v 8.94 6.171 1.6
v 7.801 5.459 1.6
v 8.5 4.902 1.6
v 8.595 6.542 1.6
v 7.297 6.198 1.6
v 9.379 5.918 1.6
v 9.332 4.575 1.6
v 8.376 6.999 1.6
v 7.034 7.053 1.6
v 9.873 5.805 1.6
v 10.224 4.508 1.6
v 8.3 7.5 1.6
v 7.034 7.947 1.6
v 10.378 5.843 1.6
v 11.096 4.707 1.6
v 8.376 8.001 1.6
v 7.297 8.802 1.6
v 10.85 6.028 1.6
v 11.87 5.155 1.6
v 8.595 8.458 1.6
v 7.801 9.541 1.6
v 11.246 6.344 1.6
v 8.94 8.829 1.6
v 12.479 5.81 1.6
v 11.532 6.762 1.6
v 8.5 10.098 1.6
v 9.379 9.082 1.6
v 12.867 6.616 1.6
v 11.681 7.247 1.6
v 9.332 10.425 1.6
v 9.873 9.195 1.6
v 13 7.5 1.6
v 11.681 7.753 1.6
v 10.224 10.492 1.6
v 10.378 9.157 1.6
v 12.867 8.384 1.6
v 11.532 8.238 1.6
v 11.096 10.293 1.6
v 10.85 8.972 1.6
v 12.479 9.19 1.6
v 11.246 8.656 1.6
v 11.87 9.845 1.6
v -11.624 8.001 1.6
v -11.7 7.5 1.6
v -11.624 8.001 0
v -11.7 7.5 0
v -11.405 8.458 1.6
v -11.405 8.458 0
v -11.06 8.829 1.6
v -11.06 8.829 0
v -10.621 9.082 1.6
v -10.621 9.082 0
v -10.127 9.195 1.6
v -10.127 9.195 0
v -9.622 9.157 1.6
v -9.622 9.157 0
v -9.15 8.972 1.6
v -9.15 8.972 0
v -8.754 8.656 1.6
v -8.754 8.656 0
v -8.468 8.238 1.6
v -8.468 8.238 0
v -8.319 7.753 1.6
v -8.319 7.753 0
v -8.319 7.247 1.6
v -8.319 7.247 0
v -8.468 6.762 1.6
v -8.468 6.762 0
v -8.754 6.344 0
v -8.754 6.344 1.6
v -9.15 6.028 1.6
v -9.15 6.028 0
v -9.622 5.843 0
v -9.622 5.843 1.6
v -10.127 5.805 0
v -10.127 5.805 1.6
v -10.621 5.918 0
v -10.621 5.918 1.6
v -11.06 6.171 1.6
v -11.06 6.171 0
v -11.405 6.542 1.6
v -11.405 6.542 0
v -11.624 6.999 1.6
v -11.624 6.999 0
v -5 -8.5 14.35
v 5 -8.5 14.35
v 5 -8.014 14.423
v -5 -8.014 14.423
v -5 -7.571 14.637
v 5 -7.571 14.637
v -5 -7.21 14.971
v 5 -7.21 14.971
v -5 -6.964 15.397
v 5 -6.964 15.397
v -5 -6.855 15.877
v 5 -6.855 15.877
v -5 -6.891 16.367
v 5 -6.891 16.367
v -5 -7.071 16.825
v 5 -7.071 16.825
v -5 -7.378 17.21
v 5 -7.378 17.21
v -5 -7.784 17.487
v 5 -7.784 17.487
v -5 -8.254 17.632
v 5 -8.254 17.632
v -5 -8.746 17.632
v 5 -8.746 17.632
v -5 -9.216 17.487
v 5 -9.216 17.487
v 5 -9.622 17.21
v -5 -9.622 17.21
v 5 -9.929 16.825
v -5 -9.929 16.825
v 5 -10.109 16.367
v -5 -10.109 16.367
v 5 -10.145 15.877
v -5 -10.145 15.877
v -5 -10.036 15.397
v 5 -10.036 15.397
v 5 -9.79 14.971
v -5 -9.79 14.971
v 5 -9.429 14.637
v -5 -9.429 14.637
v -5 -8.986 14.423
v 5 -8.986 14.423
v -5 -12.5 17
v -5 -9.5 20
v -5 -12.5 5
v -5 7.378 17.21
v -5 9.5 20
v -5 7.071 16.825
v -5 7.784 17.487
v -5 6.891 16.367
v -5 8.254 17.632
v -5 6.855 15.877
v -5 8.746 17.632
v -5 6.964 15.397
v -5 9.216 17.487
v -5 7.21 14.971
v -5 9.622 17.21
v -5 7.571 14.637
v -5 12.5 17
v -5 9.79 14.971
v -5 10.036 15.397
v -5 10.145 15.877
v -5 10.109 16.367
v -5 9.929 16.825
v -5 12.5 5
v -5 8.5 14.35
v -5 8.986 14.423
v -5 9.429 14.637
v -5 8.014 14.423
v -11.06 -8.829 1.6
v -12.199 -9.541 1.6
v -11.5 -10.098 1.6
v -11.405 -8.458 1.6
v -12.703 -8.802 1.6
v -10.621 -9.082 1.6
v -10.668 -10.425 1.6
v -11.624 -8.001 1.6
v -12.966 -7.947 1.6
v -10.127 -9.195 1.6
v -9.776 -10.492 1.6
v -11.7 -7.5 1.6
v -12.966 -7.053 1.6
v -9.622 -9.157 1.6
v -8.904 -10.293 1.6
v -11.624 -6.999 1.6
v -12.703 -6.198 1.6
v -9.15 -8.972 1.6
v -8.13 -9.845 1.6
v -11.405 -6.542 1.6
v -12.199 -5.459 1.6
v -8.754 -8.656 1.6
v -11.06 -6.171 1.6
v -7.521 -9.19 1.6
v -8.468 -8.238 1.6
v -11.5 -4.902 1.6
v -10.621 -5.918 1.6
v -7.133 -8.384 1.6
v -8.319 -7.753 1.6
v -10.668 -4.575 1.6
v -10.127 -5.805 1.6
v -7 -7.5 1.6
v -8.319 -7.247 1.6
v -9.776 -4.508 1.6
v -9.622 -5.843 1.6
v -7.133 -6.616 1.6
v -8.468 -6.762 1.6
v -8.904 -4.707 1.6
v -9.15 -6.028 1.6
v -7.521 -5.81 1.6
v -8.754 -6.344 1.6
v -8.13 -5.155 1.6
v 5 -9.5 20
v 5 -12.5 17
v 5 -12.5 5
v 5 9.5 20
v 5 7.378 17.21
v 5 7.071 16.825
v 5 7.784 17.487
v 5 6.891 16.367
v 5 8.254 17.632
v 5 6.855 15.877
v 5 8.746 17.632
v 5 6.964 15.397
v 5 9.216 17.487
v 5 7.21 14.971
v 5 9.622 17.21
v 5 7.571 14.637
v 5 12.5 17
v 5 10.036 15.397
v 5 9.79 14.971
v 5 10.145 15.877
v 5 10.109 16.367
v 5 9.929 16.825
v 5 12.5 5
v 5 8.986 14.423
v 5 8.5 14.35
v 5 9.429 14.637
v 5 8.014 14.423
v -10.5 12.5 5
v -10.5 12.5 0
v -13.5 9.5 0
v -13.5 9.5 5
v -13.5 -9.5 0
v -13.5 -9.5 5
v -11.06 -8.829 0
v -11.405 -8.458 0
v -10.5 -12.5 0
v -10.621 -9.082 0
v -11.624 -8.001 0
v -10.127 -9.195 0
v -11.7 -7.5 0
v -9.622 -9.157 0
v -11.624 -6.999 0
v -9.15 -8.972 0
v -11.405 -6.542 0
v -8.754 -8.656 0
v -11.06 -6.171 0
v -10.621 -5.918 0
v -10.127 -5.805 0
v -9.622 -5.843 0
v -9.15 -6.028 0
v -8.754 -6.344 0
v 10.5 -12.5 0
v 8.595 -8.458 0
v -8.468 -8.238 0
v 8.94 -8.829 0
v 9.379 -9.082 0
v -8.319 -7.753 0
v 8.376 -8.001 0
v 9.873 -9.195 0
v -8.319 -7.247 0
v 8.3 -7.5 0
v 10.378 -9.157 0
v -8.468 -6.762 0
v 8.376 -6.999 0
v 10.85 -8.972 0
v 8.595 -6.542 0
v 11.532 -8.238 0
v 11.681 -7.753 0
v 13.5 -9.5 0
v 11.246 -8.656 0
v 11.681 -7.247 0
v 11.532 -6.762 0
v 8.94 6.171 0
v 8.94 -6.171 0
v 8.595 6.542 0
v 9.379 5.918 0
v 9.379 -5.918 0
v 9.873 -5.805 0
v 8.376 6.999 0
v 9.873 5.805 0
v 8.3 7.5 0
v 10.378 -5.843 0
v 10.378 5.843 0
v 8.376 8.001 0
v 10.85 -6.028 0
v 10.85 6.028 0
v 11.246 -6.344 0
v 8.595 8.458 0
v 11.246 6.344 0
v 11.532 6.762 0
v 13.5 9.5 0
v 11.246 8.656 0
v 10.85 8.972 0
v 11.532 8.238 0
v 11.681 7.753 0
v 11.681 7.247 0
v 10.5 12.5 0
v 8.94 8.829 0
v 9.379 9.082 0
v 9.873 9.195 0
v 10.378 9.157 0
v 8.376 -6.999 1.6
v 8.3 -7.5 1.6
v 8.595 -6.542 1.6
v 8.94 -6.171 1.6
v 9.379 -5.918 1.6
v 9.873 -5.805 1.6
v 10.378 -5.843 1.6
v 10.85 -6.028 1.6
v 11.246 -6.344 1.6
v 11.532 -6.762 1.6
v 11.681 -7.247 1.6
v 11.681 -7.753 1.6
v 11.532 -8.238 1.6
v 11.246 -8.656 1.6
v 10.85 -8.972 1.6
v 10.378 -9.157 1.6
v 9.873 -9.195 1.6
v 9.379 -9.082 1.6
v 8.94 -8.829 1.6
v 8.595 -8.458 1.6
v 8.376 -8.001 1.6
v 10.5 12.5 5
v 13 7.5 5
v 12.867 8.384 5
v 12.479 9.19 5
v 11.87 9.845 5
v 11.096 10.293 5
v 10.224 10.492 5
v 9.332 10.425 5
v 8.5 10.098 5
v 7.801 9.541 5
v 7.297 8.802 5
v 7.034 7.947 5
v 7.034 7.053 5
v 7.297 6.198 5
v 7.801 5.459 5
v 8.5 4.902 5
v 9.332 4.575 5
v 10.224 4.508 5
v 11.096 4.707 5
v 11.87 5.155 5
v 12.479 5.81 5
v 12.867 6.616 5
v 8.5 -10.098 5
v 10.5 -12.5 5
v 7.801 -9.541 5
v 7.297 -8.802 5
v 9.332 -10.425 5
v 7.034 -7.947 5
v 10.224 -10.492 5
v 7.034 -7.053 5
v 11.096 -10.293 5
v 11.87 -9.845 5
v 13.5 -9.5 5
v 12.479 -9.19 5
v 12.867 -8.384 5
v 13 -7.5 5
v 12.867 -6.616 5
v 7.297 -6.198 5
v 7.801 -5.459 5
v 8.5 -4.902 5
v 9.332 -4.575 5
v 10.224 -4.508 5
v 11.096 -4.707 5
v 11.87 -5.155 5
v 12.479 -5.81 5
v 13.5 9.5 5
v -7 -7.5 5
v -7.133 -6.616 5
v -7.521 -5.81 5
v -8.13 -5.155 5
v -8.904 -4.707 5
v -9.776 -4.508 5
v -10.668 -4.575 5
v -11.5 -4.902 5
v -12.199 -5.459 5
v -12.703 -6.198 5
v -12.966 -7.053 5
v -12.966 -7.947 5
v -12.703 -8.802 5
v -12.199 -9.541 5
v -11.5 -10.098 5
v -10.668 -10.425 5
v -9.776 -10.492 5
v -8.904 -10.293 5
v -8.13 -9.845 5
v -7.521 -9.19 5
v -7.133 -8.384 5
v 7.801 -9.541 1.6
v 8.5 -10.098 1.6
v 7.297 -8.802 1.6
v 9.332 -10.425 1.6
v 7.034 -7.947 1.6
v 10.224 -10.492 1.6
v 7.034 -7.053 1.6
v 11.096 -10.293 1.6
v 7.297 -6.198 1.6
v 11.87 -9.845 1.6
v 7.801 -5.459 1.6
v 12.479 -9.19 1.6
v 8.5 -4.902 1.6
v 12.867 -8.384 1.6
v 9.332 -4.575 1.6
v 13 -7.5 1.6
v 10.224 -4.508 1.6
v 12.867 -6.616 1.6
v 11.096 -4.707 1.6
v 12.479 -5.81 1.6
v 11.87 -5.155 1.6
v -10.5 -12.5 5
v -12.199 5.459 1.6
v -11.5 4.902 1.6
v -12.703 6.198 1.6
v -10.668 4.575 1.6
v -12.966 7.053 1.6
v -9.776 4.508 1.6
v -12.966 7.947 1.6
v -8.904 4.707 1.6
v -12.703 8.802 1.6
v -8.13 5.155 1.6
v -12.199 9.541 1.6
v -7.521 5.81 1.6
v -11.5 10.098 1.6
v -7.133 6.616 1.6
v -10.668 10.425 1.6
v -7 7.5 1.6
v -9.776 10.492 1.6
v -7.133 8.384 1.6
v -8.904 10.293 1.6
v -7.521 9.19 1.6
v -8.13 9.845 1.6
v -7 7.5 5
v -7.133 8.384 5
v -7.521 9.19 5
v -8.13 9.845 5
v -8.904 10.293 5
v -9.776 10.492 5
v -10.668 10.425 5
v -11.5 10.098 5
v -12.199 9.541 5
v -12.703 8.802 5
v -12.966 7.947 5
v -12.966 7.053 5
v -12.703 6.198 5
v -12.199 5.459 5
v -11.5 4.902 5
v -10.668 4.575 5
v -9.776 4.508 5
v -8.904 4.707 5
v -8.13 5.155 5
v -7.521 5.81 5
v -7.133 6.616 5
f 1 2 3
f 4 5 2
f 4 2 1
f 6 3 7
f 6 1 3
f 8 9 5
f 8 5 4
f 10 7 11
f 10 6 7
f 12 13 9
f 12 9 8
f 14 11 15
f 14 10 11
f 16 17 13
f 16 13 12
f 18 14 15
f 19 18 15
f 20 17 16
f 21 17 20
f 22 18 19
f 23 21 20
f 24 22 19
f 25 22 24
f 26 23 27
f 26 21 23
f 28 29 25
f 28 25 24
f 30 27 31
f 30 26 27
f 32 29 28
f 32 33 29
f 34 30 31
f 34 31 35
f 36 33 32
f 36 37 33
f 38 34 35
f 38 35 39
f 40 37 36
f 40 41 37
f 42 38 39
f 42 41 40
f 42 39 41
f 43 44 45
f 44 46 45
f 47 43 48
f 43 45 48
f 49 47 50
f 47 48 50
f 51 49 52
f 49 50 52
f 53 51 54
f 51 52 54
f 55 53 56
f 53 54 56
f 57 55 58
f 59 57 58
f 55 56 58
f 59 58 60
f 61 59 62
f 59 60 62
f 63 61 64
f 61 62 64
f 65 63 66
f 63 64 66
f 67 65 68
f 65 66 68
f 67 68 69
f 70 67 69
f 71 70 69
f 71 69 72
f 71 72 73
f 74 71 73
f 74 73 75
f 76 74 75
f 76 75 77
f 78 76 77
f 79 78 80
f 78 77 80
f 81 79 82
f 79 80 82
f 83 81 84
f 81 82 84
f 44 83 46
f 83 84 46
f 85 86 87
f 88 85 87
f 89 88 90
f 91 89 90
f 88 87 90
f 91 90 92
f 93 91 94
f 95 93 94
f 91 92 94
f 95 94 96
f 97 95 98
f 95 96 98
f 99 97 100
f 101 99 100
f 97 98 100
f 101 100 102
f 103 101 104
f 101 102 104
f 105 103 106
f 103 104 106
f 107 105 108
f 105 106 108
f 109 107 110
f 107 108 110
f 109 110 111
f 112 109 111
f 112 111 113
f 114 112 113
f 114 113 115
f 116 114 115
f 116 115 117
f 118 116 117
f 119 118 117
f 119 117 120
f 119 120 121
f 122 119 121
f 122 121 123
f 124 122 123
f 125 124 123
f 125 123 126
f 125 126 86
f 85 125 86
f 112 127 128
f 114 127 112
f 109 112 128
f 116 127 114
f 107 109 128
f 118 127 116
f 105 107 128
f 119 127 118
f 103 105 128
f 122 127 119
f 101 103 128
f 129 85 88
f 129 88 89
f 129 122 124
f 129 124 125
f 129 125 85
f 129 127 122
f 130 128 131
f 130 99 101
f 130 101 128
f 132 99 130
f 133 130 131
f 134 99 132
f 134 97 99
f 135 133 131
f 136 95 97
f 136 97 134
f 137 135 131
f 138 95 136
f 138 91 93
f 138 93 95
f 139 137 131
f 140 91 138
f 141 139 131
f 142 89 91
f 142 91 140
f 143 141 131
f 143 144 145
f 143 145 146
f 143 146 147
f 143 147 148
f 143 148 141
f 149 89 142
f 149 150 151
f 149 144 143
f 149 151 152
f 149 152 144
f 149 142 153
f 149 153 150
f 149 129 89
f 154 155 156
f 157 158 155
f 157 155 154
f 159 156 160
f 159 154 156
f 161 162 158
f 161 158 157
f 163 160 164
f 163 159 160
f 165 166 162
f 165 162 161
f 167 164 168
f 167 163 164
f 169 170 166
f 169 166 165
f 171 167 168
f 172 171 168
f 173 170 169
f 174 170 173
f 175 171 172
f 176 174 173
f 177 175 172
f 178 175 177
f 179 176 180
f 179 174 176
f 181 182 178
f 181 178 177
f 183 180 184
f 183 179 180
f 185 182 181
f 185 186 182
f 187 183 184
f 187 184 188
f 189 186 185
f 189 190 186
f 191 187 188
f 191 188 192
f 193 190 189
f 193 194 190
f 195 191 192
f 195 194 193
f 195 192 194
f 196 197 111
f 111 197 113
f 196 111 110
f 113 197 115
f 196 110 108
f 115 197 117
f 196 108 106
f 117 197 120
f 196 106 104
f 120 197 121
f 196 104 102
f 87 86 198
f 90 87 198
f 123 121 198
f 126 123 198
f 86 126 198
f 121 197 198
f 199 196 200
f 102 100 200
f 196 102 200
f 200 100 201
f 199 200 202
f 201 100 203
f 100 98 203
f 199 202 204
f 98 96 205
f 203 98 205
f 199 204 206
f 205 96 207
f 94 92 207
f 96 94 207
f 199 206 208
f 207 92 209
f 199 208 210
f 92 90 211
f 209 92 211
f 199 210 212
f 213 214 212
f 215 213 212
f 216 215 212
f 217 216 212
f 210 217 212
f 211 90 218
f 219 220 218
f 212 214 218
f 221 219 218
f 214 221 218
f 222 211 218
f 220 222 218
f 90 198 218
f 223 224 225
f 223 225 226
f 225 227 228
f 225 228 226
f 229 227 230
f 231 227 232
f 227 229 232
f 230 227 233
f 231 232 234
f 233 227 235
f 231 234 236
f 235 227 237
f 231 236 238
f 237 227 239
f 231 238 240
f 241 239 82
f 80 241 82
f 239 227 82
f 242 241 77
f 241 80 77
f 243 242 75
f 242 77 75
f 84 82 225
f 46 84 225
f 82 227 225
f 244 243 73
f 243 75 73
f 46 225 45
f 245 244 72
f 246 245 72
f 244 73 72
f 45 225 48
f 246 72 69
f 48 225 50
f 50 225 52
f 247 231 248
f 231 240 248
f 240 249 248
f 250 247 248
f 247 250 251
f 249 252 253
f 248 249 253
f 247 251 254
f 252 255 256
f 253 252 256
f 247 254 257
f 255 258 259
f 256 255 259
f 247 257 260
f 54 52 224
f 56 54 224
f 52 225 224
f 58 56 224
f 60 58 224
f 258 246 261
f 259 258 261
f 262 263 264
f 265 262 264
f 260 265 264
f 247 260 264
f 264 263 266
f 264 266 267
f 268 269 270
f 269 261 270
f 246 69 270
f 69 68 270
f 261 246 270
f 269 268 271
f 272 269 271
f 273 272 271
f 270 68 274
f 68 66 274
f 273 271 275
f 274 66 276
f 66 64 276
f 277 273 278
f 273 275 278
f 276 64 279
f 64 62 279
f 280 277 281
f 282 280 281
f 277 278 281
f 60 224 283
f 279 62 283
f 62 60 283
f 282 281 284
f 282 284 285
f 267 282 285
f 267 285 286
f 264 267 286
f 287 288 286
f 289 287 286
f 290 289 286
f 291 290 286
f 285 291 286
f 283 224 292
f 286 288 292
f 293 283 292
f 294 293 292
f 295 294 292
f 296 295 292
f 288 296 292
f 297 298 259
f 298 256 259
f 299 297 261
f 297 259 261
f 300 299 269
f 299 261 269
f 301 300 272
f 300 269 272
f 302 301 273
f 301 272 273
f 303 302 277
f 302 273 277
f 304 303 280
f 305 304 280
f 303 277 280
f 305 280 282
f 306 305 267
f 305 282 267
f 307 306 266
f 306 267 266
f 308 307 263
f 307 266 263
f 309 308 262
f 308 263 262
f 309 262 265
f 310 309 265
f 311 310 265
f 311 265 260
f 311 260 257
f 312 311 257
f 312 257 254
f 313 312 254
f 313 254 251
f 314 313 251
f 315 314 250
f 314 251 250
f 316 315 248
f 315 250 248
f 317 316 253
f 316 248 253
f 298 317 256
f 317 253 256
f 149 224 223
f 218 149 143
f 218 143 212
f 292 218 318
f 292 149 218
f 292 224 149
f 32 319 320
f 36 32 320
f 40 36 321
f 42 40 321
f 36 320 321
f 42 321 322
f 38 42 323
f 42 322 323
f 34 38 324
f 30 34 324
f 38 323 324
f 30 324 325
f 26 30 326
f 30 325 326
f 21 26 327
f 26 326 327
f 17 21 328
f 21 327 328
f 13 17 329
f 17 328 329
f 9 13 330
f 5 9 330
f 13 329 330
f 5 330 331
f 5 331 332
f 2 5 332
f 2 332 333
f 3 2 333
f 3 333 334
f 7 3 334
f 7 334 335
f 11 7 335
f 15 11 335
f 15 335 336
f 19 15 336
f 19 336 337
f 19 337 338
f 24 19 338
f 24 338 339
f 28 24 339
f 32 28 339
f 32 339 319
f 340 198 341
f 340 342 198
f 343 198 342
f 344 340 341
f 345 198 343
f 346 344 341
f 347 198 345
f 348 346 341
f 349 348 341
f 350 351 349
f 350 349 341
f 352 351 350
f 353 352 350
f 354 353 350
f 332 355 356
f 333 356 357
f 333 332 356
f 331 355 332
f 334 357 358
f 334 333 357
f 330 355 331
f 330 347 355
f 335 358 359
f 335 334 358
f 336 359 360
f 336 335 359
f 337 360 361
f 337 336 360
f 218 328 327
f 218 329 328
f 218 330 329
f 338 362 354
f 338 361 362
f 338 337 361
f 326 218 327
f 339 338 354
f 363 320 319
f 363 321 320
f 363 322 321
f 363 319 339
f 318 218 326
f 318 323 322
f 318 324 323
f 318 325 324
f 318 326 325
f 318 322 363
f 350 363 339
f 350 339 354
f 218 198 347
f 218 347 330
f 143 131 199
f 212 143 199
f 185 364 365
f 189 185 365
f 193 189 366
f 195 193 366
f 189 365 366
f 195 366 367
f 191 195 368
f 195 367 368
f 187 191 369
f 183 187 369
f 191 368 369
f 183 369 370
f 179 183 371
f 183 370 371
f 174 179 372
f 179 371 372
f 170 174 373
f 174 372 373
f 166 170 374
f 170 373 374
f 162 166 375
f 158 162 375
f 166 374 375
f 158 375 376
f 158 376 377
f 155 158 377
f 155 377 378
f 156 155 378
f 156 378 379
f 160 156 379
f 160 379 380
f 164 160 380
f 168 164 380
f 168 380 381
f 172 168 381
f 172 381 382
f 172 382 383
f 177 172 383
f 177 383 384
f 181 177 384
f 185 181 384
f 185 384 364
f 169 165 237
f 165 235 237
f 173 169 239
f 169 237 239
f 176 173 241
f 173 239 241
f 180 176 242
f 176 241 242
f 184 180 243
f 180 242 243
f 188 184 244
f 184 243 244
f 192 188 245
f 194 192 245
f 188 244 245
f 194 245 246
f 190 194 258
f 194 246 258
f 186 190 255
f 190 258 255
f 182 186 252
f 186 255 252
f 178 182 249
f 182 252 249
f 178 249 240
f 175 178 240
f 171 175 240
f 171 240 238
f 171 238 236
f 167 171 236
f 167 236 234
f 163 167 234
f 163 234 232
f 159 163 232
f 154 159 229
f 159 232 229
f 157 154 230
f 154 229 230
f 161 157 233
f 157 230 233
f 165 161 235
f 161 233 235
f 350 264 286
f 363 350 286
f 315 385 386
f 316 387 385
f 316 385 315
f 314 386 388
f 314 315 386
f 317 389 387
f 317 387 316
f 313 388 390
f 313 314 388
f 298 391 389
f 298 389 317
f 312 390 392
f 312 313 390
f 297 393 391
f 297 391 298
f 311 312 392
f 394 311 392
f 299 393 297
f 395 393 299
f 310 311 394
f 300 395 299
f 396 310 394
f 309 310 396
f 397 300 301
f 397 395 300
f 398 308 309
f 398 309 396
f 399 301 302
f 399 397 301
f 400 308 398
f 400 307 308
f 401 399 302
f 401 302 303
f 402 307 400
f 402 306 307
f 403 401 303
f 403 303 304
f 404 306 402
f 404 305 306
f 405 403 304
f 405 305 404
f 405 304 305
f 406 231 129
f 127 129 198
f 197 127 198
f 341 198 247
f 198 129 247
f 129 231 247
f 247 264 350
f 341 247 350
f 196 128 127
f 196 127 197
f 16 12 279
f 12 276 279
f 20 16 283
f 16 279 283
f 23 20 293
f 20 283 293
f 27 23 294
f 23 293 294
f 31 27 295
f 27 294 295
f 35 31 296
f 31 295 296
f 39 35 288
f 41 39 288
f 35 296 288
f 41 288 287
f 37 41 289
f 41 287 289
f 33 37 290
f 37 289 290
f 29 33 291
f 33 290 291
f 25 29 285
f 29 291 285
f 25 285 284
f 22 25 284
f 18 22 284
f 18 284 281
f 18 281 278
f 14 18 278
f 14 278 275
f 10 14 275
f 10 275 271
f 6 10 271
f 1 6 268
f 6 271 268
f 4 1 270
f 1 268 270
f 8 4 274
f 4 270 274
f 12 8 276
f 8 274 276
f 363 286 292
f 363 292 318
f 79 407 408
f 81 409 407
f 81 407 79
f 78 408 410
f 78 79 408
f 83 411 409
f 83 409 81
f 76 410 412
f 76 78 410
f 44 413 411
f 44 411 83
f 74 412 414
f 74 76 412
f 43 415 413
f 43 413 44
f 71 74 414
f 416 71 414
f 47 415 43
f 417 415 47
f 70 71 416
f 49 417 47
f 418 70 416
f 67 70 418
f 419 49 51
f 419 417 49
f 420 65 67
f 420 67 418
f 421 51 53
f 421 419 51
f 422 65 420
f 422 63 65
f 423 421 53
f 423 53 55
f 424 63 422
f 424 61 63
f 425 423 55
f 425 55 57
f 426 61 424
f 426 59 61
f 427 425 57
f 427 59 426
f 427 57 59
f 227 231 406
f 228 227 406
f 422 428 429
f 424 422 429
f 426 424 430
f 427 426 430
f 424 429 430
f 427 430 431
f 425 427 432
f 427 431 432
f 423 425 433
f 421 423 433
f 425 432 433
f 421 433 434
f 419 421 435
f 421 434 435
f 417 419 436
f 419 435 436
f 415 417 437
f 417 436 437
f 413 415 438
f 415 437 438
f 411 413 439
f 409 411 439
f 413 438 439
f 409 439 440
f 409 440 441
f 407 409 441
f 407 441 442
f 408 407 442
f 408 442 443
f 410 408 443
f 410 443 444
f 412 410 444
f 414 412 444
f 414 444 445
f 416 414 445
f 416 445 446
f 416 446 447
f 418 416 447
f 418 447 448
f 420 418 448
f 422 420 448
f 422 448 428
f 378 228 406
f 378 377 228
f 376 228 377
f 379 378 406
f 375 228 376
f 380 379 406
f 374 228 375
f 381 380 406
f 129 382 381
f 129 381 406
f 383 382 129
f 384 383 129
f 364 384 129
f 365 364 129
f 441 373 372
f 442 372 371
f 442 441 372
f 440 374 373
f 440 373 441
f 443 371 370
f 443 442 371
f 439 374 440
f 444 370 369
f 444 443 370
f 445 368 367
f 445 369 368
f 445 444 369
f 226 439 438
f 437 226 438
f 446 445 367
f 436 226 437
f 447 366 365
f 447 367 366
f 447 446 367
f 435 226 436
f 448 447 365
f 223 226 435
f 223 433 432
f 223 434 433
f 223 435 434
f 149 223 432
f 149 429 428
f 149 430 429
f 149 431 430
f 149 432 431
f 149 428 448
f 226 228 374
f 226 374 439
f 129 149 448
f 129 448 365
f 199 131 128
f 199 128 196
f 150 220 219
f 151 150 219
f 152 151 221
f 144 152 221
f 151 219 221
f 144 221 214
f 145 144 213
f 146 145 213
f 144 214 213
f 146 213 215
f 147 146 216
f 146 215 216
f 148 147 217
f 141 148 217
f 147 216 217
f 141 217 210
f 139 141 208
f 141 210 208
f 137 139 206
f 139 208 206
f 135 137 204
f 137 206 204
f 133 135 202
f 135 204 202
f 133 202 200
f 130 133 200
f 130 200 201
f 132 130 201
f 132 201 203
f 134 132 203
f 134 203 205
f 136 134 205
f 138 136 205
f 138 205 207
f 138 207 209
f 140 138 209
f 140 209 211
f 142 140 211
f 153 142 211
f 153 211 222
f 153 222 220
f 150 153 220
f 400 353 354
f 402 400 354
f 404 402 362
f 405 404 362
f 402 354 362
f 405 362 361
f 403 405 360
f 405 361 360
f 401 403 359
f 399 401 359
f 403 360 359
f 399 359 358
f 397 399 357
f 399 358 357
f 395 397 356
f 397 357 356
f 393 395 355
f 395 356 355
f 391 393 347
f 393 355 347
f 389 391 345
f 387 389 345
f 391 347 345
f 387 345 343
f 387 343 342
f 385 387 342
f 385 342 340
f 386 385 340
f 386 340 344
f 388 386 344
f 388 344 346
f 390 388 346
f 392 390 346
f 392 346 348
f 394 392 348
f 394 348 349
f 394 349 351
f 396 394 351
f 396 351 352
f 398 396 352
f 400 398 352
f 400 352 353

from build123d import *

# Parameters (mm, degrees)
SKETCH1_W                                            = 27
SKETCH1_H                                            = 25
BOSS_EXTRUDE1_DEPTH                                  = 5
SKETCH2_W                                            = 10
SKETCH2_H                                            = 25
BOSS_EXTRUDE2_DEPTH                                  = 15
CBORE_FOR_M3_HEXAGON_SOCKET_HEAD_CAP_SCR_D           = 3.4
CBORE_FOR_M3_HEXAGON_SOCKET_HEAD_CAP_SCR_CBORE_D     = 6
CBORE_FOR_M3_HEXAGON_SOCKET_HEAD_CAP_SCR_CBORE_DEPTH = 3.4
M4_TAPPED_HOLE1_D                                    = 3.3
CHAMFER1_SIZE                                        = 3


with BuildPart() as part:
    # Sketch1 → Boss-Extrude1 (new body)
    with BuildSketch(Plane.XY):
        Rectangle(SKETCH1_W, SKETCH1_H)
    extrude(amount=BOSS_EXTRUDE1_DEPTH)

    # Sketch2 → Boss-Extrude2 (add)
    with BuildSketch(Plane.XY.offset(5)):
        Rectangle(SKETCH2_W, SKETCH2_H)
    extrude(amount=BOSS_EXTRUDE2_DEPTH)

    # CBORE for M3 Hexagon socket head cap screws1 (through all)
    with Locations(Plane.XY.offset(5)):
        with Locations((10, 7.5), (10, -7.5), (-10, -7.5), (-10, 7.5)):
            CounterBoreHole(CBORE_FOR_M3_HEXAGON_SOCKET_HEAD_CAP_SCR_D / 2, CBORE_FOR_M3_HEXAGON_SOCKET_HEAD_CAP_SCR_CBORE_D / 2, CBORE_FOR_M3_HEXAGON_SOCKET_HEAD_CAP_SCR_CBORE_DEPTH)

    # M4 Tapped Hole1 (through all)
    with Locations(Plane.ZY.offset(5)):
        with Locations((16, 8.5), (16, -8.5)):
            Hole(M4_TAPPED_HOLE1_D / 2)

    # Chamfer1
    chamfer1_edges = [part.edges().sort_by_distance(p)[0] for p in [
        (0, 12.5, 20),
        (0, -12.5, 20),
        (13.5, -12.5, 2.5),
        (-13.5, -12.5, 2.5),
        (-13.5, 12.5, 2.5),
        (13.5, 12.5, 2.5),
    ]]
    chamfer(chamfer1_edges, length=CHAMFER1_SIZE)


solid = part.part
